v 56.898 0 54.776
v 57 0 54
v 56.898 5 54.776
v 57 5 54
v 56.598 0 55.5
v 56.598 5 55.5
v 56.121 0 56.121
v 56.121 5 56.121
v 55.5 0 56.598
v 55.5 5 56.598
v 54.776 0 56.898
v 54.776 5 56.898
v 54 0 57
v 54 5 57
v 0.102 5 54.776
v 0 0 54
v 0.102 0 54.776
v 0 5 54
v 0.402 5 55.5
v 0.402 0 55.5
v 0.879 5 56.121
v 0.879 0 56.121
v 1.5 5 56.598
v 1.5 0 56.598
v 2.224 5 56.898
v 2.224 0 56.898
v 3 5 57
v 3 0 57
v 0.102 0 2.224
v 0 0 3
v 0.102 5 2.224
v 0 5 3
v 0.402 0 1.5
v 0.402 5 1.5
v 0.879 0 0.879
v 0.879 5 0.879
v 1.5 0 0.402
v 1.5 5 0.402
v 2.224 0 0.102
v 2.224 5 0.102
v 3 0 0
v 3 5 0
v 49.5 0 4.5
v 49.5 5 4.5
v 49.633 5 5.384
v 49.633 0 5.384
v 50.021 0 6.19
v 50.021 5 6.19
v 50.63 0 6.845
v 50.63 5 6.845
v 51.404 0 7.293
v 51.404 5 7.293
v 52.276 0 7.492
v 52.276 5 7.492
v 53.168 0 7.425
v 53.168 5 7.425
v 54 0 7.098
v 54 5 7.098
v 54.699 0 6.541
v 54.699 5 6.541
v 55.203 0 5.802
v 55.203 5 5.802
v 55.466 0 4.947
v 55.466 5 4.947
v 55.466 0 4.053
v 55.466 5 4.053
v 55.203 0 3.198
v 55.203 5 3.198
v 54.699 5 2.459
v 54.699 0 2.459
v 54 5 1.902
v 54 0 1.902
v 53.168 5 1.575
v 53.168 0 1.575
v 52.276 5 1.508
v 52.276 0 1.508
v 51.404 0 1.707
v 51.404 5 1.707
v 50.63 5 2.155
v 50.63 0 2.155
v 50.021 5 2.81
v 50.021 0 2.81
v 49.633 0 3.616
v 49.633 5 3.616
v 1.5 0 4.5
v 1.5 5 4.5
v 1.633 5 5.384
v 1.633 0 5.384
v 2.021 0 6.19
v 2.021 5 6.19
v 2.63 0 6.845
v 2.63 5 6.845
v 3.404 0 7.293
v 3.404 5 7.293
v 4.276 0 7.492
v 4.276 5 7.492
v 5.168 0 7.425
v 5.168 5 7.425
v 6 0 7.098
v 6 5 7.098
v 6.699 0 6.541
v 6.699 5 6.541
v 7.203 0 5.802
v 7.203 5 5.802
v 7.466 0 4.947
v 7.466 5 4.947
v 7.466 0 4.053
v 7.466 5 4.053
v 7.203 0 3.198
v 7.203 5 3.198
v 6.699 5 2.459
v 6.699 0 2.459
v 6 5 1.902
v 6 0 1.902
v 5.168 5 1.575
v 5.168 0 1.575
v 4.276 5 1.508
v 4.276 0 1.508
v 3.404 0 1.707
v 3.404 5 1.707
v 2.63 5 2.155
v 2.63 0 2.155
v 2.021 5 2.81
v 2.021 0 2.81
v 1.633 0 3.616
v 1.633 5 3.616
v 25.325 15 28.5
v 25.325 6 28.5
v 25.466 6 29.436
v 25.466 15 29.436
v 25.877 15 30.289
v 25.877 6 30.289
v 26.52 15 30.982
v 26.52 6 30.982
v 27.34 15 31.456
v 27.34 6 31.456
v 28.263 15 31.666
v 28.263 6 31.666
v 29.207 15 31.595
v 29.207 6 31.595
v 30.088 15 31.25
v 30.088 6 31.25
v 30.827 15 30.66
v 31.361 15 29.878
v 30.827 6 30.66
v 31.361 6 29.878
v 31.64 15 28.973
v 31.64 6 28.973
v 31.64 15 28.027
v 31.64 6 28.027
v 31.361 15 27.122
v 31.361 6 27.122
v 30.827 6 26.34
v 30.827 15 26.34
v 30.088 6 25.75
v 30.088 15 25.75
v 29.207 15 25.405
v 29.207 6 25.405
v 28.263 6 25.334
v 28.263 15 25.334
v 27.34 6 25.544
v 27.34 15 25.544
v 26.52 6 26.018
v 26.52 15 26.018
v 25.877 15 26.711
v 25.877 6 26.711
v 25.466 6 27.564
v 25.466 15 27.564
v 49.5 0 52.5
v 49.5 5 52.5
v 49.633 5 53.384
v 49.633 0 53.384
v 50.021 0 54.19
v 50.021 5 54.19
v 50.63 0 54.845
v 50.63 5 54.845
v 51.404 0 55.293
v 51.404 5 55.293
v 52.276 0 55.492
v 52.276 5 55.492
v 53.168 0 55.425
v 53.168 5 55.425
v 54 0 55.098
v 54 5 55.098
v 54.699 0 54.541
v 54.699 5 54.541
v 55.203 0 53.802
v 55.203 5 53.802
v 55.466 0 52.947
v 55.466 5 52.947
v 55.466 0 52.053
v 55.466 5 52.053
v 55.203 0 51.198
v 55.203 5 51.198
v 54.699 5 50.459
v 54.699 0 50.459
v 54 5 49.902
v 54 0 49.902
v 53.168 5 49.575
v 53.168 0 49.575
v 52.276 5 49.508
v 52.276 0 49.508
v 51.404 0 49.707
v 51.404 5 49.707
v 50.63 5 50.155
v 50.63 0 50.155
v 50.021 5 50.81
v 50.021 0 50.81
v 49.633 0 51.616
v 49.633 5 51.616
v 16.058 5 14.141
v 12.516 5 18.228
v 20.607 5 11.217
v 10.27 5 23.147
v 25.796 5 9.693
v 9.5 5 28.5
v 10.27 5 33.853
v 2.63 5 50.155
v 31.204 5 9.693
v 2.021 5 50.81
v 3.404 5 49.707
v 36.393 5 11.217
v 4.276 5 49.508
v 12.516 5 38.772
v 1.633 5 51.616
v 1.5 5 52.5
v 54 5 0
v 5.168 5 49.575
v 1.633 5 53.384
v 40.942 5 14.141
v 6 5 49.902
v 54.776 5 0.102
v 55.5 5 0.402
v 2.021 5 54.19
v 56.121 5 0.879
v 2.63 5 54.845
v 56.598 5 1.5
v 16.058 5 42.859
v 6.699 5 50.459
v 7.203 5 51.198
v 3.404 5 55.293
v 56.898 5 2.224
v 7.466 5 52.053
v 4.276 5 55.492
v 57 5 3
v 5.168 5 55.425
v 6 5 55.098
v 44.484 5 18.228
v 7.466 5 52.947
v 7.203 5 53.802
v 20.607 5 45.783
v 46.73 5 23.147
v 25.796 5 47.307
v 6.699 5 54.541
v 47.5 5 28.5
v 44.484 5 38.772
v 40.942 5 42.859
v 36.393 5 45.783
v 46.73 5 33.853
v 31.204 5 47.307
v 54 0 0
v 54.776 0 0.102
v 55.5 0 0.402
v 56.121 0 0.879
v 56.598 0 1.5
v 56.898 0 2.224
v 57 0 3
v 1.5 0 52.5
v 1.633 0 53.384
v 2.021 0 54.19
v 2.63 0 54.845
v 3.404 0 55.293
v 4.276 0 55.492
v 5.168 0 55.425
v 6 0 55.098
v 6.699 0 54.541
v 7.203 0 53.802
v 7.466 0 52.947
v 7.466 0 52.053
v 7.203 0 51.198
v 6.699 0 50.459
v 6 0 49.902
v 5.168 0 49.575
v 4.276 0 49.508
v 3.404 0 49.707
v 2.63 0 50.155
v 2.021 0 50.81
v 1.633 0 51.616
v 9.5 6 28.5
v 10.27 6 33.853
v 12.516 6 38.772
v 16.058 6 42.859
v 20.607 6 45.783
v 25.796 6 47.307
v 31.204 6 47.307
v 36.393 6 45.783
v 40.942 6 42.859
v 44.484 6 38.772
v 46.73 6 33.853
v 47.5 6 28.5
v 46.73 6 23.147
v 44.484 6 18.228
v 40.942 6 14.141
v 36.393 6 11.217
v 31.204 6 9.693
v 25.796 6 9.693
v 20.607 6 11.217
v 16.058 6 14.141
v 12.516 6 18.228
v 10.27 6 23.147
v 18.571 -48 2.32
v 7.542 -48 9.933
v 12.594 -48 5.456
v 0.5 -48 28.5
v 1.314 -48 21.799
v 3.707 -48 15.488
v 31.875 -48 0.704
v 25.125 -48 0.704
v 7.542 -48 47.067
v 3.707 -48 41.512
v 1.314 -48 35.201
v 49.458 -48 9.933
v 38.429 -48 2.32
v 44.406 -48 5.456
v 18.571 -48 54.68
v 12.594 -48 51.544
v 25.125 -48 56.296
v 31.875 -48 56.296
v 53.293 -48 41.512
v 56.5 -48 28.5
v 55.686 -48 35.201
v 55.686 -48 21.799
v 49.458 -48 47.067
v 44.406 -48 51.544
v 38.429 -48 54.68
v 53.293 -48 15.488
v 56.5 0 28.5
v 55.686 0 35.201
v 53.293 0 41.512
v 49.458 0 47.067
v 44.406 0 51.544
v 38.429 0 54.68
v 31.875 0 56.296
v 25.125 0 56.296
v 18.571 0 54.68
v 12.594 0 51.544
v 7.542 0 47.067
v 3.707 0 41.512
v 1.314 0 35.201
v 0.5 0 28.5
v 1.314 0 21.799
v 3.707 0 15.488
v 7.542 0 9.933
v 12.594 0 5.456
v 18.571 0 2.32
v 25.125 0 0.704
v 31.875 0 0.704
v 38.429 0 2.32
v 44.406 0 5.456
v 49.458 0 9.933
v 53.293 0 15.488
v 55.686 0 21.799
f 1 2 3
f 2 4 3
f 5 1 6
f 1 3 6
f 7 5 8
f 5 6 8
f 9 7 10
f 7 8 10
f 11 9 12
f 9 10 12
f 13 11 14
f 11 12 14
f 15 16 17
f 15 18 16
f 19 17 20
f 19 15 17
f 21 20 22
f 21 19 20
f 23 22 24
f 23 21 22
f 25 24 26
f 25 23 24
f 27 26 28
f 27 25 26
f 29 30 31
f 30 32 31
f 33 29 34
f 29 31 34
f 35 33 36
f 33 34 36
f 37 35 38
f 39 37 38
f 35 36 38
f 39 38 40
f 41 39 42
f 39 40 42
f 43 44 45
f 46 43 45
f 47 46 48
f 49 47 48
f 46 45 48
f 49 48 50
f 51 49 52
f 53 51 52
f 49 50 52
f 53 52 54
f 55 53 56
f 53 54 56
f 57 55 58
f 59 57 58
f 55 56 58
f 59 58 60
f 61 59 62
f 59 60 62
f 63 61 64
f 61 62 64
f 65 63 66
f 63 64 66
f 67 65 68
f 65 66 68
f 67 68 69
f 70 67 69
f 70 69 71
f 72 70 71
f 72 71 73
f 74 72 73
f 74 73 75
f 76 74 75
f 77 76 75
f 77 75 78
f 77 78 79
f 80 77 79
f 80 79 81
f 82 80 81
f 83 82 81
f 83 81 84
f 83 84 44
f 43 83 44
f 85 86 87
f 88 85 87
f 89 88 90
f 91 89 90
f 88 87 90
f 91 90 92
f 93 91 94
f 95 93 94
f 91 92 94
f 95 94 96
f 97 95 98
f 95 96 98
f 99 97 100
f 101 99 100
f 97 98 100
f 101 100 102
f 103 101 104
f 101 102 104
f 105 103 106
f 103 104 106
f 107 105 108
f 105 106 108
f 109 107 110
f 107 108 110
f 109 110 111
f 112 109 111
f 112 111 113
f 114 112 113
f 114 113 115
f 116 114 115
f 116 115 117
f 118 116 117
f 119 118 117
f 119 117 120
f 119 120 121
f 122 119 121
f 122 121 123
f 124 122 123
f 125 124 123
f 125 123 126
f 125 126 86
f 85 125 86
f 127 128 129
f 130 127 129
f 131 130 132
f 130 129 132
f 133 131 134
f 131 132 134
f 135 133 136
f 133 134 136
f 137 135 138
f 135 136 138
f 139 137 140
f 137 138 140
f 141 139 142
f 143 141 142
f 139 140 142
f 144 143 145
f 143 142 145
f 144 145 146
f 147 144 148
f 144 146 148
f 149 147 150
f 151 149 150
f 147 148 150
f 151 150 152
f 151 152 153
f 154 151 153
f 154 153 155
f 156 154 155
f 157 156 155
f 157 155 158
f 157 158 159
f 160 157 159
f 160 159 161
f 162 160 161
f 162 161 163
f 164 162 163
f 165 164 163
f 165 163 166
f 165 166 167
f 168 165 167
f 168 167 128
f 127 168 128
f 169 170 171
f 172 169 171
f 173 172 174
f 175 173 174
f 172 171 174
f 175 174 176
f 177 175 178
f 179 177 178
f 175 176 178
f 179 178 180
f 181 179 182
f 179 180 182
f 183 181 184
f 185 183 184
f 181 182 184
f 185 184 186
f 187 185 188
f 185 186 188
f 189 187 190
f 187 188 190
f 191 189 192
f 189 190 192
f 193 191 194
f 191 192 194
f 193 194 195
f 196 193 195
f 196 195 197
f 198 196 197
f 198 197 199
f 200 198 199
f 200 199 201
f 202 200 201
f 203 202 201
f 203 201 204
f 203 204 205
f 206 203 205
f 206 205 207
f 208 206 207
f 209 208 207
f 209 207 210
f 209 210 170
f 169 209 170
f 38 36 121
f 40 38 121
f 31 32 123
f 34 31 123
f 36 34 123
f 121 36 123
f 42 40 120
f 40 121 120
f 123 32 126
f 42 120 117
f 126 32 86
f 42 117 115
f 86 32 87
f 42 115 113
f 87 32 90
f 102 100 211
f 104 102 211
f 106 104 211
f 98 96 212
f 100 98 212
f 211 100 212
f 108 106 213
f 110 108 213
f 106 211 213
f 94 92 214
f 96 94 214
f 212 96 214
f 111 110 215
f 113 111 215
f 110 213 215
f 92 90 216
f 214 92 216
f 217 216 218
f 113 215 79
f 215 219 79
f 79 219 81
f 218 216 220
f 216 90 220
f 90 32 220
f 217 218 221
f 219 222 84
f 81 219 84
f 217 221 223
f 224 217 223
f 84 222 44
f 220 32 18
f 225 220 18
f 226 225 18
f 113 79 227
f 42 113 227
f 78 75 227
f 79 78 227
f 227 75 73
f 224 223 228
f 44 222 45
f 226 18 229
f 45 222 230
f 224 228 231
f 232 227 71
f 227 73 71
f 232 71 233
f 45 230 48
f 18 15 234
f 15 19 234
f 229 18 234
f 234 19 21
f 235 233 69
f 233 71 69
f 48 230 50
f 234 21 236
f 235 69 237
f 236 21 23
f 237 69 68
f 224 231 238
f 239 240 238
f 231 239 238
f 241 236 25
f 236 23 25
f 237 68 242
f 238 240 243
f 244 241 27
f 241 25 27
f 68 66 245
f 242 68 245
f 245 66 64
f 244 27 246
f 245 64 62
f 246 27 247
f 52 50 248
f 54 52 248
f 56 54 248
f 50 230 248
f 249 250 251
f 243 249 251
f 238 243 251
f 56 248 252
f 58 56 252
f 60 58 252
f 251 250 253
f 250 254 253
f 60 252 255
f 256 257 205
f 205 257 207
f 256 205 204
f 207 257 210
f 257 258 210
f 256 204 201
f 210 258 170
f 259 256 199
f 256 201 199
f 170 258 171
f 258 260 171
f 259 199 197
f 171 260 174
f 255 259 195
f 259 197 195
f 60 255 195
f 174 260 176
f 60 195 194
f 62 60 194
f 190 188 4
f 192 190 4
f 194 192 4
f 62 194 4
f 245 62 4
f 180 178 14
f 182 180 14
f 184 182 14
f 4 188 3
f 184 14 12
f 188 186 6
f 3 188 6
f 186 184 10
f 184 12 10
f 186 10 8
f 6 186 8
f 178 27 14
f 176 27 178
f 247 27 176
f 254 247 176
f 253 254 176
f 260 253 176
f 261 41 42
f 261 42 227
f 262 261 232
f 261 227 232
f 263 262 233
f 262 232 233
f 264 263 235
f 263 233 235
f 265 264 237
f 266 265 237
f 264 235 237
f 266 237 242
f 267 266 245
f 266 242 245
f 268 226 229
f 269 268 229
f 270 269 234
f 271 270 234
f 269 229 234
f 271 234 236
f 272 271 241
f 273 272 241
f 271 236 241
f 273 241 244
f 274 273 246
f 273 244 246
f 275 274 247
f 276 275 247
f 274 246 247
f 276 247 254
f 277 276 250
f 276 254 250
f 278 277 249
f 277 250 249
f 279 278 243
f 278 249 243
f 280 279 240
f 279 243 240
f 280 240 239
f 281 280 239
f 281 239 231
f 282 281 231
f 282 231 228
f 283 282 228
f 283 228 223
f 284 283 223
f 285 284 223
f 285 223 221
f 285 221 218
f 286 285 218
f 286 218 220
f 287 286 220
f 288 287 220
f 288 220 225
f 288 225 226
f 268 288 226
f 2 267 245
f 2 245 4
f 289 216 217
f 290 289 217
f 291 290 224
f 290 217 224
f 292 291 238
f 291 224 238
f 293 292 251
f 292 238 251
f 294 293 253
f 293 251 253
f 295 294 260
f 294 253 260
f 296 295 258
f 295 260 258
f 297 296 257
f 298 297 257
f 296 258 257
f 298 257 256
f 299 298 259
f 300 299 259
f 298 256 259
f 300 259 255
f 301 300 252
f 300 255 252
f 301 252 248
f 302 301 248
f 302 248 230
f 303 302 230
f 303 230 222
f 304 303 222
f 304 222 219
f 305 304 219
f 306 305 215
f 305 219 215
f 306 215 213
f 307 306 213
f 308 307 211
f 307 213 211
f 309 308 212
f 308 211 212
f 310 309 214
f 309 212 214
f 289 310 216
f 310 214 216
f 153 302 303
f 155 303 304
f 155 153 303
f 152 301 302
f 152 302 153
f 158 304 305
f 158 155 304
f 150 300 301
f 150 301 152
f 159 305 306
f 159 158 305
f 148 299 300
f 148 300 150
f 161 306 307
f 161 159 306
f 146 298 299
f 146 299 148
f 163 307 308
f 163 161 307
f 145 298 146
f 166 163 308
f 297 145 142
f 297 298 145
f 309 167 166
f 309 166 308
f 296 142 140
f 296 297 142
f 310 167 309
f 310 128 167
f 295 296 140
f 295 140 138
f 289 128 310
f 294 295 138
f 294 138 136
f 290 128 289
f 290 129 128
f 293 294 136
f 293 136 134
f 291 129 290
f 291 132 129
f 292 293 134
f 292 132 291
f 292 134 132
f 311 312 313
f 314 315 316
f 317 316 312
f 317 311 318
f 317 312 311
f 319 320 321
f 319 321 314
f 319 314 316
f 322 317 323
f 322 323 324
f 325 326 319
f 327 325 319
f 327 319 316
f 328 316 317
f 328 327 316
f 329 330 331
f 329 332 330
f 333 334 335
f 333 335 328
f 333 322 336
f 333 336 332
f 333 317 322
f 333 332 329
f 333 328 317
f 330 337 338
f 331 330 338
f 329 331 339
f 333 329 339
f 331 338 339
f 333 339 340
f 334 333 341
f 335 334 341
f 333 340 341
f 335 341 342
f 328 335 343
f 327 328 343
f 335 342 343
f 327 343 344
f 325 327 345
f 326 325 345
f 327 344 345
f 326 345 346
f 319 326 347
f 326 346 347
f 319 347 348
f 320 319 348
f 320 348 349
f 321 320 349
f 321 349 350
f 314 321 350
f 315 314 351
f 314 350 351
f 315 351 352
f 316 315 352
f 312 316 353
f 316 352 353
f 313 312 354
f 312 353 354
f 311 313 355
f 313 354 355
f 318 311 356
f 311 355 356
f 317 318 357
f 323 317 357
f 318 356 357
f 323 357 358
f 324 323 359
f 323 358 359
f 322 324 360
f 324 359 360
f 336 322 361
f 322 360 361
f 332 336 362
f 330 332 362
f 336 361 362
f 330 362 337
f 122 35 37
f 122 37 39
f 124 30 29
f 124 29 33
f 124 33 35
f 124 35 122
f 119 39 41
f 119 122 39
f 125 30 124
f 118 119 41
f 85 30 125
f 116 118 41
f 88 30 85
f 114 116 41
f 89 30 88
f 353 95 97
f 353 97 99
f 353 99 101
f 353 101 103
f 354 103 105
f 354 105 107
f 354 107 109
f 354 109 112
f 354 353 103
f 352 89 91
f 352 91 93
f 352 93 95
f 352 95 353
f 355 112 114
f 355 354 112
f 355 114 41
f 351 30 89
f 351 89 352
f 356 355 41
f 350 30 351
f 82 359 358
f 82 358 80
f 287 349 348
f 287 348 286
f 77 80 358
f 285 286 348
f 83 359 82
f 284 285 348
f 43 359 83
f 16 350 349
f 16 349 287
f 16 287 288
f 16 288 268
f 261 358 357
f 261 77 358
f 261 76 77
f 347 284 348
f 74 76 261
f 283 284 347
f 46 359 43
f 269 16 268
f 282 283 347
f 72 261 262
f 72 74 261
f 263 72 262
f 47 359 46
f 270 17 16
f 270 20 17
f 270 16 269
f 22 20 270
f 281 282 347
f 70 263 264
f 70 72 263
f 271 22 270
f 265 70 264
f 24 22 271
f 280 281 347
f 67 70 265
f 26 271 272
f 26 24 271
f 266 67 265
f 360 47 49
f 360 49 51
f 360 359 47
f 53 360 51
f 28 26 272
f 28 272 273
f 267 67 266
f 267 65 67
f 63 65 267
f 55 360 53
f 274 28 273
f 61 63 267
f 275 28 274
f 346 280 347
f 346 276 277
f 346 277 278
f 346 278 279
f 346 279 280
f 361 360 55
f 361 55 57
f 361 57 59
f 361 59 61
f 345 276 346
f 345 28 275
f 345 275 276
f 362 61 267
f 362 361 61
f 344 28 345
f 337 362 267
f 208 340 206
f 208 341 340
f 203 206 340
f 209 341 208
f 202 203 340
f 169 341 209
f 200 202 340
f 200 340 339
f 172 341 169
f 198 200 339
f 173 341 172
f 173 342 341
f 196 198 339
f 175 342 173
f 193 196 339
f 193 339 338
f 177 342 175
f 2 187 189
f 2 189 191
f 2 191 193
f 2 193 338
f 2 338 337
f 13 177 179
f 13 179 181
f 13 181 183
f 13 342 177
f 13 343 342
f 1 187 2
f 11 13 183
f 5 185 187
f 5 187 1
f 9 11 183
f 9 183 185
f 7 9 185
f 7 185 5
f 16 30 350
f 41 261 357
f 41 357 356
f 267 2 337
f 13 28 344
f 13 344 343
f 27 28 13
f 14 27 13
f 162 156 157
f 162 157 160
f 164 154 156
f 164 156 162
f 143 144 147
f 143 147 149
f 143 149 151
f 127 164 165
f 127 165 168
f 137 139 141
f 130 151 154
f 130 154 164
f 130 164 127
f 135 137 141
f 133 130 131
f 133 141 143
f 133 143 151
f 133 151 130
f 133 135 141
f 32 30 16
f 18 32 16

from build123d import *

# Parameters (mm, degrees)
SKETCH_W     = 57
SKETCH_H     = 57
PAD_DEPTH    = 5
FILLET_R     = 3
SKETCH001_R  = 28
PAD001_DEPTH = 48
SKETCH002_R  = 3.175
PAD002_DEPTH = 10
SKETCH003_R  = 19
PAD003_DEPTH = 1
SKETCH004_R  = 3
POCKET_DEPTH = 53.001


with BuildPart() as part:
    # Sketch → Pad (new body)
    with BuildSketch(Plane.XZ):
        with Locations((28.5, 28.5)):
            Rectangle(SKETCH_W, SKETCH_H)
    extrude(amount=-PAD_DEPTH)

    # Fillet
    fillet_edges = [part.edges().sort_by_distance(p)[0] for p in [
        (0, 2.5, 0),
        (57, 2.5, 0),
        (57, 2.5, 57),
        (0, 2.5, 57),
    ]]
    fillet(fillet_edges, radius=FILLET_R)

    # Sketch001 → Pad001 (new body)
    with BuildSketch(Plane.XZ):
        with Locations((28.5, 28.5)):
            Circle(SKETCH001_R)
    extrude(amount=PAD001_DEPTH)

    # Sketch002 → Pad002 (new body)
    with BuildSketch(Plane(origin=(0, 5, 0), x_dir=(-1, 0, 0), z_dir=(0, 1, 0))):
        with Locations((-28.5, 28.5)):
            Circle(SKETCH002_R)
    extrude(amount=PAD002_DEPTH)

    # Sketch003 → Pad003 (new body)
    with BuildSketch(Plane(origin=(0, 5, 0), x_dir=(-1, 0, 0), z_dir=(0, 1, 0))):
        with Locations((-28.5, 28.5)):
            Circle(SKETCH003_R)
    extrude(amount=PAD003_DEPTH)

    # Sketch004 → Pocket (cut, through all)
    with BuildSketch(Plane(origin=(0, 5, 0), x_dir=(-1, 0, 0), z_dir=(0, 1, 0))):
        with Locations((-52.5, 52.5)):
            Circle(SKETCH004_R)
        with Locations((-4.5, 52.5)):
            Circle(SKETCH004_R)
        with Locations((-52.5, 4.5)):
            Circle(SKETCH004_R)
        with Locations((-4.5, 4.5)):
            Circle(SKETCH004_R)
    extrude(amount=-POCKET_DEPTH, mode=Mode.SUBTRACT)


solid = part.part
